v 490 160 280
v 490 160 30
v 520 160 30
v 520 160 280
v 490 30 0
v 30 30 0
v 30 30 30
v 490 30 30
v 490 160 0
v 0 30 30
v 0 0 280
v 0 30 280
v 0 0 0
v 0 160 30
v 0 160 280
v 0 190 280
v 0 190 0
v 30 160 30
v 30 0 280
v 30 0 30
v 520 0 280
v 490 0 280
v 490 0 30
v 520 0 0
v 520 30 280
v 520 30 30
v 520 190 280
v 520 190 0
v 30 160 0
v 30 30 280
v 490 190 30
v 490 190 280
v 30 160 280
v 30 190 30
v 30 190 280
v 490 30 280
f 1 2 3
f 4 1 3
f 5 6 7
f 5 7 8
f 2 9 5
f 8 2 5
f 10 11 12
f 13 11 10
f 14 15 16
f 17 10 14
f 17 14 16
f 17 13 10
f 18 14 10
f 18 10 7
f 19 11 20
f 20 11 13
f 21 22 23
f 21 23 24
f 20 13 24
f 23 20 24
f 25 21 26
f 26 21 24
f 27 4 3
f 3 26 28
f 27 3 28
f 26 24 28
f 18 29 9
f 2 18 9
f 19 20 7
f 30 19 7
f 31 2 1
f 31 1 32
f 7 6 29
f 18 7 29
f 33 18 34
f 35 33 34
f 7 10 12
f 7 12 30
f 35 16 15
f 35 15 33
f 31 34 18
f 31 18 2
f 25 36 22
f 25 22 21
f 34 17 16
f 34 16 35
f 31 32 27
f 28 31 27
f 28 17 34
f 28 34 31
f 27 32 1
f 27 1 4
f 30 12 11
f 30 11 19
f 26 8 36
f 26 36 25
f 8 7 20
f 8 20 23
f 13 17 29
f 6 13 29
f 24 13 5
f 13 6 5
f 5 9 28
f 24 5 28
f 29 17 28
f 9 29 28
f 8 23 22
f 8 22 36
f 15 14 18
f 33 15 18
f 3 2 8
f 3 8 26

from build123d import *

# Parameters (mm, degrees)
SKETCH_1_W      = 30
SKETCH_1_H      = 190
SKETCH_1_W_2    = 460
SKETCH_1_H_2    = 30
EXTRUDE_1_DEPTH = 30
SKETCH_2_W      = 30
SKETCH_2_H      = 30
EXTRUDE_2_DEPTH = 250


with BuildPart() as part:
    # 草图1 → 凸台-拉伸1 (new body)
    with BuildSketch(Plane.XY):
        with Locations((15, 95)):
            Rectangle(SKETCH_1_W, SKETCH_1_H)
        with Locations((260, 175)):
            Rectangle(SKETCH_1_W_2, SKETCH_1_H_2)
        with Locations((260, 15)):
            Rectangle(SKETCH_1_W_2, SKETCH_1_H_2)
        Polygon((490, 30), (490, 0), (520, 0), (520, 190), (490, 190), (490, 160), align=None)
    extrude(amount=EXTRUDE_1_DEPTH)

    # 草图2 → 凸台-拉伸2 (add)
    with BuildSketch(Plane.XY.offset(30)):
        with Locations((15, 175)):
            Rectangle(SKETCH_2_W, SKETCH_2_H)
        with Locations((15, 15)):
            Rectangle(SKETCH_2_W, SKETCH_2_H)
        with Locations((505, 175)):
            Rectangle(SKETCH_2_W, SKETCH_2_H)
        with Locations((505, 15)):
            Rectangle(SKETCH_2_W, SKETCH_2_H)
    extrude(amount=EXTRUDE_2_DEPTH)


solid = part.part
